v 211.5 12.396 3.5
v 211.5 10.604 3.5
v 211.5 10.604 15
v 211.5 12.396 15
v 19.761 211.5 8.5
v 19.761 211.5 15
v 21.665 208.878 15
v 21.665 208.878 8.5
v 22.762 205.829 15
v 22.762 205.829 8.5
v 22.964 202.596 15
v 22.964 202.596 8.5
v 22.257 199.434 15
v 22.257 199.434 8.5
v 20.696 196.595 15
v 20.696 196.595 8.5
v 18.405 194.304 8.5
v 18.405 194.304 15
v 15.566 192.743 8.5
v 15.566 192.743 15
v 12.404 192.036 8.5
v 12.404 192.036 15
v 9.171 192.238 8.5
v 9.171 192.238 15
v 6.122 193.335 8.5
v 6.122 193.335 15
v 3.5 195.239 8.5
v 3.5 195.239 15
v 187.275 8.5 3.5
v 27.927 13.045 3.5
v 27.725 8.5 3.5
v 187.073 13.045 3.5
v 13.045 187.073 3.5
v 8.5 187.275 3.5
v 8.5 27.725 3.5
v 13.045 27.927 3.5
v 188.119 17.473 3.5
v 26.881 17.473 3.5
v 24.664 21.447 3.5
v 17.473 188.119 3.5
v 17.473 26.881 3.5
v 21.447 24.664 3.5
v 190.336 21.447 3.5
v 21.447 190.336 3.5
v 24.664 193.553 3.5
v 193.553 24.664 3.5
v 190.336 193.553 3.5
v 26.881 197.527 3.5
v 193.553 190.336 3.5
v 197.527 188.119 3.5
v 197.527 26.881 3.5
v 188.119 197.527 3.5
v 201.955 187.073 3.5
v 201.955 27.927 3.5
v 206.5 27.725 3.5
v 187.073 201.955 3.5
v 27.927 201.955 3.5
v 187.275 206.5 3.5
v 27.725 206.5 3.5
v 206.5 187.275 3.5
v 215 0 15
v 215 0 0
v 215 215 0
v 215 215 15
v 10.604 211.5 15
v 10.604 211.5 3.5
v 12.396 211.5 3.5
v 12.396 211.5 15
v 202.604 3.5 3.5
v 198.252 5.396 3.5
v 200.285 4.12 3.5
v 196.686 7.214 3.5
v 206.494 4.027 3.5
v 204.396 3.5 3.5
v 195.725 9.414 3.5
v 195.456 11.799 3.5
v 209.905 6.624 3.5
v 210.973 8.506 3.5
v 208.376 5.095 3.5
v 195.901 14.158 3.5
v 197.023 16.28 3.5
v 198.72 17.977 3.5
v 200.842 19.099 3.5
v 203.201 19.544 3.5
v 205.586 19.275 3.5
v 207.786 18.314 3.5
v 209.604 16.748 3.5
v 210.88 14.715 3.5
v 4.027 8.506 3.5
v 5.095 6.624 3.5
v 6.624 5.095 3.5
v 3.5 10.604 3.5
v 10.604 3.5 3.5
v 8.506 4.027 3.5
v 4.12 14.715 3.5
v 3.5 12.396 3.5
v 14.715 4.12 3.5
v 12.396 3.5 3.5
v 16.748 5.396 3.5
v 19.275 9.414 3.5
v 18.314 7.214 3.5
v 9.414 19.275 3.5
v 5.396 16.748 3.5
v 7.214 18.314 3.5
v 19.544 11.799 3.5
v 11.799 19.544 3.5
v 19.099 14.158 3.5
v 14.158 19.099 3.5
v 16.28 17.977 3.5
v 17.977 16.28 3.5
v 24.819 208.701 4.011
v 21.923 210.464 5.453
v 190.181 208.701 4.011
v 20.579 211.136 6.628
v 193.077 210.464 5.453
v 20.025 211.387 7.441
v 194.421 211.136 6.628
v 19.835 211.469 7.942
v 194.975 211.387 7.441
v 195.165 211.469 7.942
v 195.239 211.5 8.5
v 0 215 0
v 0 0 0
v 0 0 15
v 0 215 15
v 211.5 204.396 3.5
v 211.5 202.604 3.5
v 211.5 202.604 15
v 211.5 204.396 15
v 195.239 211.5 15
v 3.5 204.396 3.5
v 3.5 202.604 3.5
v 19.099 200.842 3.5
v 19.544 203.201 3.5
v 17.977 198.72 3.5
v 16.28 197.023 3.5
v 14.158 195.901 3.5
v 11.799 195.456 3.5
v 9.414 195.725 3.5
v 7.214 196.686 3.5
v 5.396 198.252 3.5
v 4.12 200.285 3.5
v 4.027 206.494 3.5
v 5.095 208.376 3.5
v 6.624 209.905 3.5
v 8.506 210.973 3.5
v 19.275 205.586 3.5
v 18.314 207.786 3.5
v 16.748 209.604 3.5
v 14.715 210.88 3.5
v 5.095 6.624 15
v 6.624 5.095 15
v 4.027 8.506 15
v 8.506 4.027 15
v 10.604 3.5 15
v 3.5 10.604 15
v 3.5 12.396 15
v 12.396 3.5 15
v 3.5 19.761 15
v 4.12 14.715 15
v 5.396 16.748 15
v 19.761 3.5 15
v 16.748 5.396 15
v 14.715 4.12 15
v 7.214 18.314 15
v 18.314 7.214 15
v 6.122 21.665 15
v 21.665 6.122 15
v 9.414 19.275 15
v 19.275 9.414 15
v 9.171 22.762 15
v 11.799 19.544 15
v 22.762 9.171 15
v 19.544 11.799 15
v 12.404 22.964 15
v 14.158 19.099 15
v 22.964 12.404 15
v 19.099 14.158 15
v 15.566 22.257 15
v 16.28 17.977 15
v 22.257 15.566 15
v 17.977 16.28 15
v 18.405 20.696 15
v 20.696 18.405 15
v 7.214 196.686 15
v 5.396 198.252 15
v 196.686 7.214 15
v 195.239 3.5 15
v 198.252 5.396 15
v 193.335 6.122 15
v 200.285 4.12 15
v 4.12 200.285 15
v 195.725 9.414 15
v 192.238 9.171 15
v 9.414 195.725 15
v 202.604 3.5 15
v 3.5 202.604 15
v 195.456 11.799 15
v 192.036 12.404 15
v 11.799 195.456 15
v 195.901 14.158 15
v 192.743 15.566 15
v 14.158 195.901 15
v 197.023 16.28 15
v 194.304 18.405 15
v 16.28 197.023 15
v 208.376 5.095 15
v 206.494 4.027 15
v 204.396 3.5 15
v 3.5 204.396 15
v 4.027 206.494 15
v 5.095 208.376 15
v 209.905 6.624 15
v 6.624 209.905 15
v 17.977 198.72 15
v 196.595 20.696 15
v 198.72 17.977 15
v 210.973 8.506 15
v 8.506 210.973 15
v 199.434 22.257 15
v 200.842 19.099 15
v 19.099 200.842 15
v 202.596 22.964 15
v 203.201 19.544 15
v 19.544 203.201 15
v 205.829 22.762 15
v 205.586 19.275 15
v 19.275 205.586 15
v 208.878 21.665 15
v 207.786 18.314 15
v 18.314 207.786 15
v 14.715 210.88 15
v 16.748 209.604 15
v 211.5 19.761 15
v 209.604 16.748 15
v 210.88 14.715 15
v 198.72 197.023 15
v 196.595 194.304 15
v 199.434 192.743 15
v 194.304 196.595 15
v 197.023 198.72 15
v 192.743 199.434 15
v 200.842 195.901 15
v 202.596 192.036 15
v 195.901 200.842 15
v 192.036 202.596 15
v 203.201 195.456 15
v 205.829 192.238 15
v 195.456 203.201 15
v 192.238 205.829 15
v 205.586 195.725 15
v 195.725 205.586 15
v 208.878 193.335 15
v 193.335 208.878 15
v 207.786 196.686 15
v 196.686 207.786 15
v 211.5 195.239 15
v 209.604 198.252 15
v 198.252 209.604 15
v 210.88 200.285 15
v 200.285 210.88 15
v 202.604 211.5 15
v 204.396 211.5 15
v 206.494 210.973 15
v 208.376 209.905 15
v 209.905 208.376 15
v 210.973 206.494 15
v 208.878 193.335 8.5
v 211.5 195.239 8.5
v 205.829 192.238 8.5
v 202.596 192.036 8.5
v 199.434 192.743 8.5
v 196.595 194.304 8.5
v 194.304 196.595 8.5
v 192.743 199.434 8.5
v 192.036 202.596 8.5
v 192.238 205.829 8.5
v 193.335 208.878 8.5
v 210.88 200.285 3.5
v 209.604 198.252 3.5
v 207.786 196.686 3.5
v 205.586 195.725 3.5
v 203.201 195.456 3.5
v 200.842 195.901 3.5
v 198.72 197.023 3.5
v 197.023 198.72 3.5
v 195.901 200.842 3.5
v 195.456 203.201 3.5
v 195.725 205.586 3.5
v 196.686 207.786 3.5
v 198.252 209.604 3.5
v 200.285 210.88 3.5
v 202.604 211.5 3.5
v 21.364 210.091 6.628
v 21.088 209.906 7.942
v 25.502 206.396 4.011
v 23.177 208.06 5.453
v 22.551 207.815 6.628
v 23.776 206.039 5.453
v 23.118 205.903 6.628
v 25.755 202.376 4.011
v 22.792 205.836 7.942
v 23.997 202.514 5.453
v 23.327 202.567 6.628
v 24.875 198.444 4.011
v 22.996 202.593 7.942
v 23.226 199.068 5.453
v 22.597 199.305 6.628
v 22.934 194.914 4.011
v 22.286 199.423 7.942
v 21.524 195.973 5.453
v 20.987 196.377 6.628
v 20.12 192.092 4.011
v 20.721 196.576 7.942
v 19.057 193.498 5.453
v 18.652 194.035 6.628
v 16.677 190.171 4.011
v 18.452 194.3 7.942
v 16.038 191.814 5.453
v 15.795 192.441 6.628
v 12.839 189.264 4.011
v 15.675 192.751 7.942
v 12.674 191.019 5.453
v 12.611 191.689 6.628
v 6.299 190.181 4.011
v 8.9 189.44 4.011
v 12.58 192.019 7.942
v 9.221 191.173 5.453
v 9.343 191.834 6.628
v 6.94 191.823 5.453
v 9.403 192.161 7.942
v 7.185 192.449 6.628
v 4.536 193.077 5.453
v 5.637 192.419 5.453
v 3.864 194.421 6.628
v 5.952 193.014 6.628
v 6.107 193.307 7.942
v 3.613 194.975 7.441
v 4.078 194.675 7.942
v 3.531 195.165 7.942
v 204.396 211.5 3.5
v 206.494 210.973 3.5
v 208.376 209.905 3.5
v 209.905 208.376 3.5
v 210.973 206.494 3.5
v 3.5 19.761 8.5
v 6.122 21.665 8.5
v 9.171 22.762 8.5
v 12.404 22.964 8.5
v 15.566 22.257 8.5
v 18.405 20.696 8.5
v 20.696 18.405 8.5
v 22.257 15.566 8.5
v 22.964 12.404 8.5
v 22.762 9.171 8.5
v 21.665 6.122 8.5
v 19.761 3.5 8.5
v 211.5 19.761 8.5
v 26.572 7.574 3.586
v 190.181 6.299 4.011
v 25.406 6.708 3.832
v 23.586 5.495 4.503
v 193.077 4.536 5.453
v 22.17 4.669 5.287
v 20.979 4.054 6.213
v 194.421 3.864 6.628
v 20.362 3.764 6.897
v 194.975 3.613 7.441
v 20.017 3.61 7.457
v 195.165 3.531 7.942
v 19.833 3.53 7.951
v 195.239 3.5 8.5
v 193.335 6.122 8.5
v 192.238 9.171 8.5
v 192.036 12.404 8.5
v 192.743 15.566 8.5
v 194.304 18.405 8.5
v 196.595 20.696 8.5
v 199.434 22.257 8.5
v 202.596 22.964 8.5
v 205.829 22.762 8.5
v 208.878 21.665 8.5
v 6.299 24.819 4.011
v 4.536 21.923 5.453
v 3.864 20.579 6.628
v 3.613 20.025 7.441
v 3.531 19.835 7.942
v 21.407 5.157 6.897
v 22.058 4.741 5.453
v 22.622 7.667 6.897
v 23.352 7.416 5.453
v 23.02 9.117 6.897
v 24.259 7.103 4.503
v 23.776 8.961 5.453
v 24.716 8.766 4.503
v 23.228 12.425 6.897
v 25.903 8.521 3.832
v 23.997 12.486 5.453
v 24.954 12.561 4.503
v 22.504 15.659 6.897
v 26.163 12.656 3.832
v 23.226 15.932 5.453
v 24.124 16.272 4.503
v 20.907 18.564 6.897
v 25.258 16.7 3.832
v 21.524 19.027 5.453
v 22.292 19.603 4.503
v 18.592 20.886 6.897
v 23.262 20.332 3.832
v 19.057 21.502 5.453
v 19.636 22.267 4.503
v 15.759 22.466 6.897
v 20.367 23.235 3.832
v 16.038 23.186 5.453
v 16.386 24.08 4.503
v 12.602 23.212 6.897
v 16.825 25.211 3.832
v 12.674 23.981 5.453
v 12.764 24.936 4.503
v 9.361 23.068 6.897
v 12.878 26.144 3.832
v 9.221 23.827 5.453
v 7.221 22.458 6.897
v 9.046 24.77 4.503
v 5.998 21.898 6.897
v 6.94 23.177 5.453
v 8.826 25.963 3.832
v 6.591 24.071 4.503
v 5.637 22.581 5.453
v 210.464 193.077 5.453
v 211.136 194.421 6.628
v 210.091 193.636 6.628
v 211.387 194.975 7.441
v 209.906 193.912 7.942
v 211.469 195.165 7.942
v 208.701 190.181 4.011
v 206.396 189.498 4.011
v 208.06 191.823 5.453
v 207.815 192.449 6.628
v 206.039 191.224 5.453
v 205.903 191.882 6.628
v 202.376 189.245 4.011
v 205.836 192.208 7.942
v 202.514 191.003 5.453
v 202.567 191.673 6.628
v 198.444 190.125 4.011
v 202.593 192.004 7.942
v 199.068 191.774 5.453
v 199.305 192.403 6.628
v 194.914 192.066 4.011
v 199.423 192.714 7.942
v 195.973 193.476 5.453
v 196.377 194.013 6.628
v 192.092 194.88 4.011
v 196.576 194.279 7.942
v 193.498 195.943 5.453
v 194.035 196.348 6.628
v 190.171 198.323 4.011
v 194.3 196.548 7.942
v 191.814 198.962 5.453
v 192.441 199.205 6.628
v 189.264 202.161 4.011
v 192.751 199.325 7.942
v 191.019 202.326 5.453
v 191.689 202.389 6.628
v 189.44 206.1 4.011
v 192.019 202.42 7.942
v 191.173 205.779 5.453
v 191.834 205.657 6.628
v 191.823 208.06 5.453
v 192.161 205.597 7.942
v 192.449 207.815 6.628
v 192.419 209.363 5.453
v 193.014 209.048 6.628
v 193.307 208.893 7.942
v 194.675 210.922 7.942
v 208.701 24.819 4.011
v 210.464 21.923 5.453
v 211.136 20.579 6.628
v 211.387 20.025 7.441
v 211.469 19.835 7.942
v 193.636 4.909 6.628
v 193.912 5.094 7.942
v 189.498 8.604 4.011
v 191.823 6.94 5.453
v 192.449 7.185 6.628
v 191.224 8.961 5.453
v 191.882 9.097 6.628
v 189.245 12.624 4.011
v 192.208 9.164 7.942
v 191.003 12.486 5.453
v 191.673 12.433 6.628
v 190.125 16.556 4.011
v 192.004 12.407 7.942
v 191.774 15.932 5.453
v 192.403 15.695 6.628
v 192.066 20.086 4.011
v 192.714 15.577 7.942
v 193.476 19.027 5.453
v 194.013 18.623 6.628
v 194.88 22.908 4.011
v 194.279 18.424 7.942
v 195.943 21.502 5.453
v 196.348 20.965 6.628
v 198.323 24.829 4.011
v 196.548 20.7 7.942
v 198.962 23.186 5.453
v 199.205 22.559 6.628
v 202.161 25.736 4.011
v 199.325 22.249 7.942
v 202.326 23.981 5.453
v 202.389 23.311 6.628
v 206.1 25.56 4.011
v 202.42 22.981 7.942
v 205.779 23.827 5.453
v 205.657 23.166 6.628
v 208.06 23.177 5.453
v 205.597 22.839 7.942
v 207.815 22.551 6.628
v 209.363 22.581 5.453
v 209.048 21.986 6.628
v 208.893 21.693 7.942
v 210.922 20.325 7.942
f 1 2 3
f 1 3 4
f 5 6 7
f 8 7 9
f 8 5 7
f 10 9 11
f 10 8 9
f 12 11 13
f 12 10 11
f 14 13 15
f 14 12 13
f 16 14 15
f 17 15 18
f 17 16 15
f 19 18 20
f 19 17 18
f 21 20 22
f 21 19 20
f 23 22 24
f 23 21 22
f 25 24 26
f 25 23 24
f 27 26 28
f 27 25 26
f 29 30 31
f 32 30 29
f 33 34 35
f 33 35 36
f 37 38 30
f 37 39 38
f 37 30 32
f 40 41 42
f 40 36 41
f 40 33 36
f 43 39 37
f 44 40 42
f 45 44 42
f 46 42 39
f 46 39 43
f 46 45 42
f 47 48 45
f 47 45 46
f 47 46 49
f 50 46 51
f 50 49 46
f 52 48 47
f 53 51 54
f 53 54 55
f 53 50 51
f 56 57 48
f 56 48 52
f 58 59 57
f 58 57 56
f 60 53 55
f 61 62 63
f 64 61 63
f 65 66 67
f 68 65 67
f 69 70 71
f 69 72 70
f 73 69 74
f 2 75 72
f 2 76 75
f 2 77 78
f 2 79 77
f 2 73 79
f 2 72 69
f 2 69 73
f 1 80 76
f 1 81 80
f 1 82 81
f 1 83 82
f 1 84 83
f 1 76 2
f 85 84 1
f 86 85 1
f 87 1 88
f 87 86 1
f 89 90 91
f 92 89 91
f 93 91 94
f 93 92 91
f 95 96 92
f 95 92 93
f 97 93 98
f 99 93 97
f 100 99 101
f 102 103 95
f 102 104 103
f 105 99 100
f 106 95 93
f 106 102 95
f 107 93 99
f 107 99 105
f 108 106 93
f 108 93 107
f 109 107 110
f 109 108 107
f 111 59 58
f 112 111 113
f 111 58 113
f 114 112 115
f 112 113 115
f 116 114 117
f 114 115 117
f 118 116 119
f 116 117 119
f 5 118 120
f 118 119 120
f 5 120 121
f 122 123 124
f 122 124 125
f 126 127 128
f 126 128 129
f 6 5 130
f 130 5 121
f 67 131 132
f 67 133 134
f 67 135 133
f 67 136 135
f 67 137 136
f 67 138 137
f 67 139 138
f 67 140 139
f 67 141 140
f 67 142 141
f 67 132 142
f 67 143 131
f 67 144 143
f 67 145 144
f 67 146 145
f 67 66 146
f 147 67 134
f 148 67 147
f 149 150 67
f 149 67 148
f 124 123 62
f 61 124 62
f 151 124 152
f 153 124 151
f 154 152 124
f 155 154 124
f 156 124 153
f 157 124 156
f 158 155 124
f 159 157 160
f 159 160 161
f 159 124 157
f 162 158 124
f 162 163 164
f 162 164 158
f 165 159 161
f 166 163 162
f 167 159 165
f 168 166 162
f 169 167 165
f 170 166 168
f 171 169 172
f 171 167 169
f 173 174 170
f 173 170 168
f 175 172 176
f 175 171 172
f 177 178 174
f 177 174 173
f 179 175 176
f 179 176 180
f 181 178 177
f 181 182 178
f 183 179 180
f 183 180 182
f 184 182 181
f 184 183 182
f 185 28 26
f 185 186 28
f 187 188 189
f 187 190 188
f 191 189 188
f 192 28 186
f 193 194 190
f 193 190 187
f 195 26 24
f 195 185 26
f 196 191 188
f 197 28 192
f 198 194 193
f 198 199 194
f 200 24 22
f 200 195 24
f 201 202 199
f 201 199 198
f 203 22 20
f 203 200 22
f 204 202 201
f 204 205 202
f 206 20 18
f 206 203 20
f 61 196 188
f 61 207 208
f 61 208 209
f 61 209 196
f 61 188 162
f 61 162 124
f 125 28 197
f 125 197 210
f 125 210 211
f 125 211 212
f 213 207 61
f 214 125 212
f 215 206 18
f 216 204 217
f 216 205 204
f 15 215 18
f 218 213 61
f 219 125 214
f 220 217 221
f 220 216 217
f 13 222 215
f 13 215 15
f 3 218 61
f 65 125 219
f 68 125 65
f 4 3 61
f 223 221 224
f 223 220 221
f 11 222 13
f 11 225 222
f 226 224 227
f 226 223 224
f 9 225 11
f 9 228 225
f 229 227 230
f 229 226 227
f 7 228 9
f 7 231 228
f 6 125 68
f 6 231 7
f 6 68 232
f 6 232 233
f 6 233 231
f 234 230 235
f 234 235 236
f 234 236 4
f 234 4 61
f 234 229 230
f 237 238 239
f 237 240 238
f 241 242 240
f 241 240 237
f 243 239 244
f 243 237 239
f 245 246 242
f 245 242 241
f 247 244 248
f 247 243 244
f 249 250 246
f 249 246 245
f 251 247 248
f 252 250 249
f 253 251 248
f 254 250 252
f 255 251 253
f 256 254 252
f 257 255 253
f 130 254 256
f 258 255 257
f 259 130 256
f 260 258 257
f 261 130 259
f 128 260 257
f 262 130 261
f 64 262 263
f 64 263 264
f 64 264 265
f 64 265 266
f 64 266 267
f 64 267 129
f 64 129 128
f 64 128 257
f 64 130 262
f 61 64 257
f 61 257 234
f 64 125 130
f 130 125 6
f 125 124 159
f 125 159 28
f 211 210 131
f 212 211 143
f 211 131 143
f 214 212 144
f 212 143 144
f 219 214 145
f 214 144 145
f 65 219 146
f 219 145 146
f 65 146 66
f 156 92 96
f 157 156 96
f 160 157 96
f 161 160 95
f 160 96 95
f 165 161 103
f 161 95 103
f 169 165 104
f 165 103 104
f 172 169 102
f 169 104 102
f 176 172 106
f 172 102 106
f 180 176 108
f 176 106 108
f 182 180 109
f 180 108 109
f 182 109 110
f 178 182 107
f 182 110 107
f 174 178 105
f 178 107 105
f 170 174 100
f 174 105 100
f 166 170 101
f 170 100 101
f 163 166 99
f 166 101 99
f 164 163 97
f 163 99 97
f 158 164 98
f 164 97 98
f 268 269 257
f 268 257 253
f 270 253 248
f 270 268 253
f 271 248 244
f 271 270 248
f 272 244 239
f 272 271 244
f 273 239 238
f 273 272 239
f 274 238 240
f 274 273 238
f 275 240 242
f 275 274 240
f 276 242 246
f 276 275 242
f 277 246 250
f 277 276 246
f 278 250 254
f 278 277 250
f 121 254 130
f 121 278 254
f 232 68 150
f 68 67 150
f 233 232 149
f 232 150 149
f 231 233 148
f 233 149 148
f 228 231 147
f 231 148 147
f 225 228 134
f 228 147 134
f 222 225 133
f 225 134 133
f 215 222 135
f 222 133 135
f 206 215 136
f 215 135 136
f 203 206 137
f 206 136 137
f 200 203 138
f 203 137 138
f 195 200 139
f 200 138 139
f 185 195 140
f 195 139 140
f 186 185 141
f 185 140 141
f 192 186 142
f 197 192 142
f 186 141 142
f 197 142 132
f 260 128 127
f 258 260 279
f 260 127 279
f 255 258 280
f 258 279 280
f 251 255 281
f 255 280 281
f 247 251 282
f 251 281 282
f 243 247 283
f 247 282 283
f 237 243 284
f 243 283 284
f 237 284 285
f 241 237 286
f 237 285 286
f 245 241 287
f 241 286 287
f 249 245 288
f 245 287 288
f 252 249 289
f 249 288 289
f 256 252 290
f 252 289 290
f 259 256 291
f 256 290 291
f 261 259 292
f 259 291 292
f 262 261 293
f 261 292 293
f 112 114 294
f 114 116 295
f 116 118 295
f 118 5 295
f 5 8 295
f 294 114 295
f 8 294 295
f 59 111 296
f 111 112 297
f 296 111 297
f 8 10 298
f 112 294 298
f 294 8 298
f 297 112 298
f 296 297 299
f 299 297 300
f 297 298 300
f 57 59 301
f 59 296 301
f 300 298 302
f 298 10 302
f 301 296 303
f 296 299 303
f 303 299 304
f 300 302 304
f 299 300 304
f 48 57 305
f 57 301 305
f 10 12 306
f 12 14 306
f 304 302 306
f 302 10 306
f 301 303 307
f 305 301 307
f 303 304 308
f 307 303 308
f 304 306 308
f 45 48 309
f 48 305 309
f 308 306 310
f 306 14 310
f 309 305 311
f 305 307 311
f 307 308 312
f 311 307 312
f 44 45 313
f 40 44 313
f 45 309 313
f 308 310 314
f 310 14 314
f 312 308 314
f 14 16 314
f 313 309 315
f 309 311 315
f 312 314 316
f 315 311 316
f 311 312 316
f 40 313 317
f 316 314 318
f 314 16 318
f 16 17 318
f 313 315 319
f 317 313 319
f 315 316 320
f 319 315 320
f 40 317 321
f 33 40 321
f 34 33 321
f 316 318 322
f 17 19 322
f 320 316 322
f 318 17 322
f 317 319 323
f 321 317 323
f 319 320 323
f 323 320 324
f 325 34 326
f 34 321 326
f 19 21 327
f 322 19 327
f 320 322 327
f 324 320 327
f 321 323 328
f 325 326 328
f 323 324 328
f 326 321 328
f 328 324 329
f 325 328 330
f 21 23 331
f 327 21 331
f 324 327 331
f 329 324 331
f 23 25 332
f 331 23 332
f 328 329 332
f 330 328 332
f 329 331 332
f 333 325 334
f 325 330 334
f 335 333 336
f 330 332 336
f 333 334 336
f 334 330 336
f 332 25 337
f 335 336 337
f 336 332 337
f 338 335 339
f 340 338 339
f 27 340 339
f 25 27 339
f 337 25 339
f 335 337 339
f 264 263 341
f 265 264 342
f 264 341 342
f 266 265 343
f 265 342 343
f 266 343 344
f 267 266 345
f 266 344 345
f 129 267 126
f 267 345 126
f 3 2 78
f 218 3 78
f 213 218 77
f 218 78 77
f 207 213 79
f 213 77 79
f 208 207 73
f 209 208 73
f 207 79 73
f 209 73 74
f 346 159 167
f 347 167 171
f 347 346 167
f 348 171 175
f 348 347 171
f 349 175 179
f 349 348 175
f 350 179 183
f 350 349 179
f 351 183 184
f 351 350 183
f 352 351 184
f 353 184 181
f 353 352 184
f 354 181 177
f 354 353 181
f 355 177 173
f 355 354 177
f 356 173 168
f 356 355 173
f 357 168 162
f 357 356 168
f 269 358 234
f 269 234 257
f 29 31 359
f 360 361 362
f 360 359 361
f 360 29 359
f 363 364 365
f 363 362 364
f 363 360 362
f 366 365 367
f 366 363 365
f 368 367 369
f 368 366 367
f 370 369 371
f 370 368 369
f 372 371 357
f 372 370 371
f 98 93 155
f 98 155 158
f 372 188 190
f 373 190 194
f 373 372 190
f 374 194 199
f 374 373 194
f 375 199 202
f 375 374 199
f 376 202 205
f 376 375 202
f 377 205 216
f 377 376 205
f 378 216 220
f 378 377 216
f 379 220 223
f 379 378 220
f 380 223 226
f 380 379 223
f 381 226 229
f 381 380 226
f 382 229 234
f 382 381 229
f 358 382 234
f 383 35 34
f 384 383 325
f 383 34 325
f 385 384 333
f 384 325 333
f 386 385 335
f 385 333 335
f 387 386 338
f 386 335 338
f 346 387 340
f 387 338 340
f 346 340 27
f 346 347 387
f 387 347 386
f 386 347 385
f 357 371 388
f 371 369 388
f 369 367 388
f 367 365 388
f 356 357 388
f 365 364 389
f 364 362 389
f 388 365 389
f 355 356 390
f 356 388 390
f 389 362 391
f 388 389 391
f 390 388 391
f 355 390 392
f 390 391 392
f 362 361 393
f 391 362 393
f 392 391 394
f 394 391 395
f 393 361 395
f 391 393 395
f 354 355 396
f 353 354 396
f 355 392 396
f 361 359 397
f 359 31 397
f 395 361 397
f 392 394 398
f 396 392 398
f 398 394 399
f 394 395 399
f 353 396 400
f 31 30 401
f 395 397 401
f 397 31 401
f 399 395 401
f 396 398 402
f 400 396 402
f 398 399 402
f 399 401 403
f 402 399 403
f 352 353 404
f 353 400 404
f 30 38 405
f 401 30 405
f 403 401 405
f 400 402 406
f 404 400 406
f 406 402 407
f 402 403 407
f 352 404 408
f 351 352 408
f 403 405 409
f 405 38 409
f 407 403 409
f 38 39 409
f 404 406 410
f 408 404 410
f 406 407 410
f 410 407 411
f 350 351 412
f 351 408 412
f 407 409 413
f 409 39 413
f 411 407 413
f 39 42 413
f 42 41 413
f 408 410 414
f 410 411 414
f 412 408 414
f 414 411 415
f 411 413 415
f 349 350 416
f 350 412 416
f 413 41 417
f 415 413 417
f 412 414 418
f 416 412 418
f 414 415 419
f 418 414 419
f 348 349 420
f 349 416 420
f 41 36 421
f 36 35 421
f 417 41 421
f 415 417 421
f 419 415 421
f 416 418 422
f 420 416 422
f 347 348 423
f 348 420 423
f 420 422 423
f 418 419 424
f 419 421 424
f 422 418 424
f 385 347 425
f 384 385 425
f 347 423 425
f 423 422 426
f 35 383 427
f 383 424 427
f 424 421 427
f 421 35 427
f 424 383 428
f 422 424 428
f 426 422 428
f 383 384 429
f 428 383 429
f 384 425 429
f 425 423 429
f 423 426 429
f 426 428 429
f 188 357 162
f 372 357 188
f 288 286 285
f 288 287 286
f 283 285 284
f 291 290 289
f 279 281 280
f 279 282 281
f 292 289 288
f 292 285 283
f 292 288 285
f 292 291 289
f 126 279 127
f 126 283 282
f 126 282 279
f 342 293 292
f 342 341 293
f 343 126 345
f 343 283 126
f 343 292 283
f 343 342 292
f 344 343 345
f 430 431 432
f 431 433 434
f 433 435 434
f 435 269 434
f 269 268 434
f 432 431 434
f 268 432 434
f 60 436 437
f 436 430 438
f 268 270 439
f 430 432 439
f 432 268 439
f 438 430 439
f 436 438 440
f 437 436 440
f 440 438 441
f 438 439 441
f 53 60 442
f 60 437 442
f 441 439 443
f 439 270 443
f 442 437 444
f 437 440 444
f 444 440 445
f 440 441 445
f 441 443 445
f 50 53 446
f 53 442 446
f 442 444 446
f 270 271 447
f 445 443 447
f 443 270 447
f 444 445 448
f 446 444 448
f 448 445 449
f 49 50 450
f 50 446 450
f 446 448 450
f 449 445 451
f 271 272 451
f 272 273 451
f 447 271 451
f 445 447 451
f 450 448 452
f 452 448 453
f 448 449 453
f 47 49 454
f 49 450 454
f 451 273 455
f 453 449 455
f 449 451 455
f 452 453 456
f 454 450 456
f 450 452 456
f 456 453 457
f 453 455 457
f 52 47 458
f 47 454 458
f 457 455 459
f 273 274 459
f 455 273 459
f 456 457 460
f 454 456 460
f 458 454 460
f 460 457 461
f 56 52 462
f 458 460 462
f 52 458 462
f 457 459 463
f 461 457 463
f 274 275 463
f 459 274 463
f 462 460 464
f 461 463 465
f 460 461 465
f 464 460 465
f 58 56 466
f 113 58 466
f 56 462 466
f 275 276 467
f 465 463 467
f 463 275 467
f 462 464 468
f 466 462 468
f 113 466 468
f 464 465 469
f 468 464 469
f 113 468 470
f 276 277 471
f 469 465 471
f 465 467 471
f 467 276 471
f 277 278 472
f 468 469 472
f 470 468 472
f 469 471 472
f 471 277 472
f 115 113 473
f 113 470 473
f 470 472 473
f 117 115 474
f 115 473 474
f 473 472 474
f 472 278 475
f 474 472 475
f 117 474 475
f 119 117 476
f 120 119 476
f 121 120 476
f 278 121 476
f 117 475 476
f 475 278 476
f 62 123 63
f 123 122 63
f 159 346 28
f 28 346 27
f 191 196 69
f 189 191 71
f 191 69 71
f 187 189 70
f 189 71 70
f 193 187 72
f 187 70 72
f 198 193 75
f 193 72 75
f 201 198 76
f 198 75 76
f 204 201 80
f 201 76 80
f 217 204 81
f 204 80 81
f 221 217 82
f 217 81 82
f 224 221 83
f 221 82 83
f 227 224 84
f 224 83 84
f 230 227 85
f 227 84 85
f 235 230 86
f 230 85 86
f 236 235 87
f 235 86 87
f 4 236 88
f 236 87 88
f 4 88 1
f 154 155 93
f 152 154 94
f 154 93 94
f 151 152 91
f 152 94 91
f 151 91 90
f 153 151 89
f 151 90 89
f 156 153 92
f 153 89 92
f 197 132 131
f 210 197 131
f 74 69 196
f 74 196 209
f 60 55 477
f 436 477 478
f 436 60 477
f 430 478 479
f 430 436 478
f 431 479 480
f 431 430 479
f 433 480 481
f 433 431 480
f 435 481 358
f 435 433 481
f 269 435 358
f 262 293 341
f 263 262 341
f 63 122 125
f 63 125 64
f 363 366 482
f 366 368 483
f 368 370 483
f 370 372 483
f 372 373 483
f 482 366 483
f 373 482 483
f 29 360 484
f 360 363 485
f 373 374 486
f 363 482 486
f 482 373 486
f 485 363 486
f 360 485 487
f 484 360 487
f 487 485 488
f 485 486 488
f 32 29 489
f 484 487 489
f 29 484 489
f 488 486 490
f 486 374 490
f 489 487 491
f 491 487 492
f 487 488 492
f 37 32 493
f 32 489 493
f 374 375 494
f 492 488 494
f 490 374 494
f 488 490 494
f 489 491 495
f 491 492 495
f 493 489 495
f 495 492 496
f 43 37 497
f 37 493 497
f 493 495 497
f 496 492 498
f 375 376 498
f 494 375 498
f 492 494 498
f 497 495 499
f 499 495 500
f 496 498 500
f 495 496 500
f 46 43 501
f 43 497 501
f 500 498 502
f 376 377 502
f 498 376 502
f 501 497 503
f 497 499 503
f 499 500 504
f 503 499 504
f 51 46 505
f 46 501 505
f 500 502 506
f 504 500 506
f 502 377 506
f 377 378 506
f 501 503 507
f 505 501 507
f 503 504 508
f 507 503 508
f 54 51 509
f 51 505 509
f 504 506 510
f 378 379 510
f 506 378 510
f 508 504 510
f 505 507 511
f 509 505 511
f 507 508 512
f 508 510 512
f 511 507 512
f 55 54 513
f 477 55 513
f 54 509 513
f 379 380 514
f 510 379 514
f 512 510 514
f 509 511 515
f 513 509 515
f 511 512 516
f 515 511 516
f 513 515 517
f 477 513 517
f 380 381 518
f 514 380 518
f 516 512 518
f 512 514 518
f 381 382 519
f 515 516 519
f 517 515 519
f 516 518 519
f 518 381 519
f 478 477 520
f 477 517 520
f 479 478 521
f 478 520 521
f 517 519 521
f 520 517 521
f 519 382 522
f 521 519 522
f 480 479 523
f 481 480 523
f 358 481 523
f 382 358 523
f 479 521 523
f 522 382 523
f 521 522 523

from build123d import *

# Parameters (mm, degrees)
F0_W     = 215
F0_H     = 215
F1_DEPTH = 15
F2_T     = -3.5
F3_R     = 11.5
F3_R_2   = 8.05
F4_DEPTH = 15
F5_R     = 5


with BuildPart() as f1:
    # F0 (on Top) → F1 (new body)
    with BuildSketch(Plane.XY):
        with Locations((107.5, 107.5)):
            Rectangle(F0_W, F0_H)
    extrude(amount=F1_DEPTH)

    # F2
    f2_openings = [f1.faces().sort_by_distance(p)[0] for p in [
        (107.5, 107.5, 15),
    ]]
    offset(amount=F2_T, openings=f2_openings)

    # F3 (on face) → F4 (join, through all)
    with BuildSketch(Plane(origin=(0, 0, 0), x_dir=(1, 0, 0), z_dir=(0, 0, -1))):
        with Locations((11.5, -11.5)):
            Circle(F3_R)
        with Locations((11.5, -11.5)):
            Circle(F3_R_2, mode=Mode.SUBTRACT)
        with Locations((11.5, -203.5)):
            Circle(F3_R)
        with Locations((11.5, -203.5)):
            Circle(F3_R_2, mode=Mode.SUBTRACT)
        with Locations((203.5, -11.5)):
            Circle(F3_R)
        with Locations((203.5, -11.5)):
            Circle(F3_R_2, mode=Mode.SUBTRACT)
        with Locations((203.5, -203.5)):
            Circle(F3_R)
        with Locations((203.5, -203.5)):
            Circle(F3_R_2, mode=Mode.SUBTRACT)
    extrude(amount=-F4_DEPTH)

    # F5
    f5_edges = [f1.edges().sort_by_distance(p)[0] for p in [
        (19.631728, 195.368272, 3.5),
        (107.5, 211.5, 3.5),
        (3.5, 107.5, 3.5),
        (195.368272, 195.368272, 3.5),
        (211.5, 107.5, 3.5),
        (19.631728, 19.631728, 3.5),
        (107.5, 3.5, 3.5),
        (195.368272, 19.631728, 3.5),
    ]]
    fillet(f5_edges, radius=F5_R)


solid = f1.part
